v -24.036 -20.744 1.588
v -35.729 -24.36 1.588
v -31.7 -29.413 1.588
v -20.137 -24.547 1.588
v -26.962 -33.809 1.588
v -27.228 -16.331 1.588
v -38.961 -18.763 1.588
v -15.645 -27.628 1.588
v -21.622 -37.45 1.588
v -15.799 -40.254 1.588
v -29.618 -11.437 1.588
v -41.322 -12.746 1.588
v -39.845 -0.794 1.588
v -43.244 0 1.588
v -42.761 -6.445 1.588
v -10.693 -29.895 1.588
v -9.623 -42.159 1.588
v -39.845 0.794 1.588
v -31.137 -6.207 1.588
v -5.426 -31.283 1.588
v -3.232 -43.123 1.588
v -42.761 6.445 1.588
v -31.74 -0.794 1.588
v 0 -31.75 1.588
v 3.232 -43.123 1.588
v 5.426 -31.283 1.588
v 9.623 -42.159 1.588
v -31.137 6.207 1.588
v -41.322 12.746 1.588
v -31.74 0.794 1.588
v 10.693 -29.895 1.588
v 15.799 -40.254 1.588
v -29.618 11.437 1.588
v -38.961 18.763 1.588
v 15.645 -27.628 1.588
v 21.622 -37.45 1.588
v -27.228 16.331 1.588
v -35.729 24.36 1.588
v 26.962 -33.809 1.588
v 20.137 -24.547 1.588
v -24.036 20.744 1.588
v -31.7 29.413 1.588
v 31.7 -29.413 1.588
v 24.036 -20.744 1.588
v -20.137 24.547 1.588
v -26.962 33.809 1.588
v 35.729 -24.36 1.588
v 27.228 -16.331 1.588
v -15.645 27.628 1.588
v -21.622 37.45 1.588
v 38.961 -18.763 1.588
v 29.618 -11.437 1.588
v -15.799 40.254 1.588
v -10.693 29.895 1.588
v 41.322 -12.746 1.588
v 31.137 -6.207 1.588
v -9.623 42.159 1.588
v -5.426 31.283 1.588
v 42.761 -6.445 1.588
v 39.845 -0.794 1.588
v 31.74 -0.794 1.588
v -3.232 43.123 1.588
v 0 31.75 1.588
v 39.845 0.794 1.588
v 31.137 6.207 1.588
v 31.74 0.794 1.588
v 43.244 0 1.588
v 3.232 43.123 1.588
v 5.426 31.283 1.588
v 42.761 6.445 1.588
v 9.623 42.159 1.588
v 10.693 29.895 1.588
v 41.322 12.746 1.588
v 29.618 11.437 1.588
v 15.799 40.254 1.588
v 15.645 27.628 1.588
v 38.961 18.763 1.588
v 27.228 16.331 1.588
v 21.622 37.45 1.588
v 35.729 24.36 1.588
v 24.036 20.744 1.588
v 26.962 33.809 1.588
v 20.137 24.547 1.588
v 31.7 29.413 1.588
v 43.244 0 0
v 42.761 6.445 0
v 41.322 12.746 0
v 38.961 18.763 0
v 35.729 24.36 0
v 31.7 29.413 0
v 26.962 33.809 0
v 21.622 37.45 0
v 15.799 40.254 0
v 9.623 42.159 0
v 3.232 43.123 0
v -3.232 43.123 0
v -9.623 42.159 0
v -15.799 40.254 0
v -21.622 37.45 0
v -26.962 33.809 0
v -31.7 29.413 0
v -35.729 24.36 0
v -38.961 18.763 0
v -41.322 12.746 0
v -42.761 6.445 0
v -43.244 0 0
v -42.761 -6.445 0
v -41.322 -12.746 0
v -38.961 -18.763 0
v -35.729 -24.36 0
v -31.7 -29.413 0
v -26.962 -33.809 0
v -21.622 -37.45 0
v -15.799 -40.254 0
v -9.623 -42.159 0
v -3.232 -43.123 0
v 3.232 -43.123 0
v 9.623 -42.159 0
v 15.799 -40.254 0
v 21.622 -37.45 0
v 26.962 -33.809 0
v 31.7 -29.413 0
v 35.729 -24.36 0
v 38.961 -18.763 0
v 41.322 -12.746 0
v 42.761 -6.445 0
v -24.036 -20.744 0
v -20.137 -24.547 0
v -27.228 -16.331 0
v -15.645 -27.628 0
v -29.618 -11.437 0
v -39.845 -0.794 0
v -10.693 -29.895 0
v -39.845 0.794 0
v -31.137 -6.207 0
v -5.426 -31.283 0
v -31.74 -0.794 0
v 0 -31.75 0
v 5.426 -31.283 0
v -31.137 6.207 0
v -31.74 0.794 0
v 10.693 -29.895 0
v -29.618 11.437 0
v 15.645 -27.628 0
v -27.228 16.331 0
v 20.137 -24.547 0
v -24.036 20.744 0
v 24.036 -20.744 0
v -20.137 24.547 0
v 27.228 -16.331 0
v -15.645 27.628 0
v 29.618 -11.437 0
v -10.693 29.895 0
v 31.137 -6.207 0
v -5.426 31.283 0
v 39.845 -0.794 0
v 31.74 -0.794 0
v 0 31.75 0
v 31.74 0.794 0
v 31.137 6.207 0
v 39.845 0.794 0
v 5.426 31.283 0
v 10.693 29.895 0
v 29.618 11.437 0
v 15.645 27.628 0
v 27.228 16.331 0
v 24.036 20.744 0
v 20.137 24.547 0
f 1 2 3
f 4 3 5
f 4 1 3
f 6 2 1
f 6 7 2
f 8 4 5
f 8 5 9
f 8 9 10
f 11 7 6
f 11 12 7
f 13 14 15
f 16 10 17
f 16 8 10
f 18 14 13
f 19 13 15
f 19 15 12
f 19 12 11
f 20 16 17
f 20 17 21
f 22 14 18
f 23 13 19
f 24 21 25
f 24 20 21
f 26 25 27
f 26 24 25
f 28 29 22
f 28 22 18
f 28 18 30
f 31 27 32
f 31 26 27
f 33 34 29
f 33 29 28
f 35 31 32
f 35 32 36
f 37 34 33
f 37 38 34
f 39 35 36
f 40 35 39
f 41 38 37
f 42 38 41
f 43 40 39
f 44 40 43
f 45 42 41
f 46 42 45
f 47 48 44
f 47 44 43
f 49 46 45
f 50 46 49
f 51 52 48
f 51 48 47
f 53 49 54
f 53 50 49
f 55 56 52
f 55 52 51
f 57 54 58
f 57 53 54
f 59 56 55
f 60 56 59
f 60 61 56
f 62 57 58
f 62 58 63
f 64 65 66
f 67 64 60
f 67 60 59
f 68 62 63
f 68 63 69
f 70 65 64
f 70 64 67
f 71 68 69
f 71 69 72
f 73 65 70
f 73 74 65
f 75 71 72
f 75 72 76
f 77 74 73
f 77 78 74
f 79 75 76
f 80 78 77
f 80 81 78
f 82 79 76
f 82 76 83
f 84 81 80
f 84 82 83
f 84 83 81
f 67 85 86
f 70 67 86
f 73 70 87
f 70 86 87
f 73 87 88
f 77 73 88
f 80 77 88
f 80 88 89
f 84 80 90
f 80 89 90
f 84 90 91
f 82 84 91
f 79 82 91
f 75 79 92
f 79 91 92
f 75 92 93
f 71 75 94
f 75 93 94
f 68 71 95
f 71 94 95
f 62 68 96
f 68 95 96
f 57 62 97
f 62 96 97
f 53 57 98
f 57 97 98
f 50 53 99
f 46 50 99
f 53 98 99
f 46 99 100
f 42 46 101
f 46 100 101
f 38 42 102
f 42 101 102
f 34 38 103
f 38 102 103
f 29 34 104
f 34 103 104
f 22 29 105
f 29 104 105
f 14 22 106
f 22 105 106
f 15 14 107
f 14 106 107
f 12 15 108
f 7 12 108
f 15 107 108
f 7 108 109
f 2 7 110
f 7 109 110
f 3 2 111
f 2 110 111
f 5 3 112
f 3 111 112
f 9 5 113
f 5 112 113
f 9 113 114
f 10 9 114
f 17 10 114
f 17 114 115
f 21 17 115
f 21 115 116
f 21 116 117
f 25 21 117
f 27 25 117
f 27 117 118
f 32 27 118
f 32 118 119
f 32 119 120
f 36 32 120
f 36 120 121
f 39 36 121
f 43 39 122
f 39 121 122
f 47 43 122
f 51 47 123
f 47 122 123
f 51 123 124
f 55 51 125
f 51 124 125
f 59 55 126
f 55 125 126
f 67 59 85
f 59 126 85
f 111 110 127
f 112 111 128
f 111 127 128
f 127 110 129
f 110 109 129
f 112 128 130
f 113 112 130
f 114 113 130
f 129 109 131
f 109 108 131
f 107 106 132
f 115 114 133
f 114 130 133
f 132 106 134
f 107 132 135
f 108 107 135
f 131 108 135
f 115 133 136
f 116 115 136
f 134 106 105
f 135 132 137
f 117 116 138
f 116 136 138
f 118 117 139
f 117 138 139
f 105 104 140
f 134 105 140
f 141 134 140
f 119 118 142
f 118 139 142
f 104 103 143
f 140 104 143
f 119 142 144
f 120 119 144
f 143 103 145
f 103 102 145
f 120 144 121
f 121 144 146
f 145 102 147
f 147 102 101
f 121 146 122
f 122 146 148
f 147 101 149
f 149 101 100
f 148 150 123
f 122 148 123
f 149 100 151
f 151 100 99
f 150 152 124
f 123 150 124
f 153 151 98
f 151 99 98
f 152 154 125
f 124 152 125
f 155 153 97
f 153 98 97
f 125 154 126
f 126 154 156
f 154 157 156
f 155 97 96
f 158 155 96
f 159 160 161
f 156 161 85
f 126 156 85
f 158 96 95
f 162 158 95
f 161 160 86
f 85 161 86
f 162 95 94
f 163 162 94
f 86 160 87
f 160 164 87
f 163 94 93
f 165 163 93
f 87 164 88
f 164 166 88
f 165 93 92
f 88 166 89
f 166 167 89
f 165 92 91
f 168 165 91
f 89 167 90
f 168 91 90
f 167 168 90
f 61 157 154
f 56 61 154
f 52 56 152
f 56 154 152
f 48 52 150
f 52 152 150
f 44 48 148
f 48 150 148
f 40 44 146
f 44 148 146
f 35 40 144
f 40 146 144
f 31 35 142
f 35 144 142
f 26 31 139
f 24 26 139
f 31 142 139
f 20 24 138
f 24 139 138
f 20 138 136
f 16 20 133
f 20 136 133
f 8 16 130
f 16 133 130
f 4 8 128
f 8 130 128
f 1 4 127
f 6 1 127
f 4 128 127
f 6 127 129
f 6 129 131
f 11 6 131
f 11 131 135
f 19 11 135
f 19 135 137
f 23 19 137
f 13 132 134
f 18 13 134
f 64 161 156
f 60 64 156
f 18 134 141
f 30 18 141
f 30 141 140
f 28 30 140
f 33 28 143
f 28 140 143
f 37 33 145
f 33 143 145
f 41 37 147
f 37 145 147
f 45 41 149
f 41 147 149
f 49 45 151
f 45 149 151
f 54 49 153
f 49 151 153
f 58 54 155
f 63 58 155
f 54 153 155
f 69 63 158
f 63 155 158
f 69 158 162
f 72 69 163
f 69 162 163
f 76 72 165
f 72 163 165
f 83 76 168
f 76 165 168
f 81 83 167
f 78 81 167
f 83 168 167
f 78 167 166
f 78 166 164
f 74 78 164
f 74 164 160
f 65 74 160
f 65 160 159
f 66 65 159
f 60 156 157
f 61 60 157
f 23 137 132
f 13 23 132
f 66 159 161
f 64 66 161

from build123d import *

# Parameters (mm, degrees)
SKETCH1_R           = 43.2435
BOSS_EXTRUDE1_DEPTH = 1.5875


with BuildPart() as part:
    # Sketch1 → Boss-Extrude1 (new body)
    with BuildSketch(Plane.XY):
        Circle(SKETCH1_R)
        with BuildLine():
            Line((39.84498, 0.79375), (39.84498, -0.79375))
            Line((39.84498, -0.79375), (31.740076574, -0.79375))
            ThreePointArc((31.740076574, -0.79375), (0, -31.75), (-31.740076574, -0.79375))
            Line((-31.740076574, -0.79375), (-39.84498, -0.79375))
            Line((-39.84498, -0.79375), (-39.84498, 0.79375))
            Line((-39.84498, 0.79375), (-31.740076574, 0.79375))
            ThreePointArc((-31.740076574, 0.79375), (0, 31.75), (31.740076574, 0.79375))
            Line((31.740076574, 0.79375), (39.84498, 0.79375))
        make_face(mode=Mode.SUBTRACT)
    extrude(amount=BOSS_EXTRUDE1_DEPTH)


solid = part.part
